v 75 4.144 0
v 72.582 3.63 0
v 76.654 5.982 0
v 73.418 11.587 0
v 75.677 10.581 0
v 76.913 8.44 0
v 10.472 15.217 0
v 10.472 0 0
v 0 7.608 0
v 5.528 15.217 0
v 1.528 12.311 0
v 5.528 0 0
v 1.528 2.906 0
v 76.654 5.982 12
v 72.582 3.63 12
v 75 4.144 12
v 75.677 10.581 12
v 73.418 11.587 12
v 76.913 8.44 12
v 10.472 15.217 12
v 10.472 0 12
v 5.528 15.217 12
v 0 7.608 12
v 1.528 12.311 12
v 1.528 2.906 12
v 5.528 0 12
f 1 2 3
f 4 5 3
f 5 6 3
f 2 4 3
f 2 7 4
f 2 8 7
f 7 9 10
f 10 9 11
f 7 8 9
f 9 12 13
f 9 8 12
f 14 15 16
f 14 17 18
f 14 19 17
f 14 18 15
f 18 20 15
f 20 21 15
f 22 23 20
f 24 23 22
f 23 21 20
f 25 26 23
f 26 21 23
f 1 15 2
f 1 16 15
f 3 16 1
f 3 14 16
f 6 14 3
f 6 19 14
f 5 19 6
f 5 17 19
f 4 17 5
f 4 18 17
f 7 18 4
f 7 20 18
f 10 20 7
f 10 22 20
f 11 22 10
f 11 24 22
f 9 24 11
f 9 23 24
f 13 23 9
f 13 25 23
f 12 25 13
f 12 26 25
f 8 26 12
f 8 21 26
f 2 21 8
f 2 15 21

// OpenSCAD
$fn = 32;

// ----------------------------------------------------------------------
// Lever arm: two bosses 16 and 8 mm, 65 mm between centres
// ----------------------------------------------------------------------

// --- parameters (mm) ---
profile_height = 12;      // extrusion height
profile_points = 13;      // points of the closed outline

profile = [[0, 7.608], [1.528, 2.906], [5.528, 0], [10.472, 0], [72.582, 3.63], [75, 4.144], [76.654, 5.982], [76.913, 8.44], [75.677, 10.581], [73.418, 11.587], [10.472, 15.217], [5.528, 15.217], [1.528, 12.311]];  // single closed polygon, 13 points, counter clockwise

// --- the one profile operation ---
linear_extrude(height = profile_height) polygon(points = profile);
